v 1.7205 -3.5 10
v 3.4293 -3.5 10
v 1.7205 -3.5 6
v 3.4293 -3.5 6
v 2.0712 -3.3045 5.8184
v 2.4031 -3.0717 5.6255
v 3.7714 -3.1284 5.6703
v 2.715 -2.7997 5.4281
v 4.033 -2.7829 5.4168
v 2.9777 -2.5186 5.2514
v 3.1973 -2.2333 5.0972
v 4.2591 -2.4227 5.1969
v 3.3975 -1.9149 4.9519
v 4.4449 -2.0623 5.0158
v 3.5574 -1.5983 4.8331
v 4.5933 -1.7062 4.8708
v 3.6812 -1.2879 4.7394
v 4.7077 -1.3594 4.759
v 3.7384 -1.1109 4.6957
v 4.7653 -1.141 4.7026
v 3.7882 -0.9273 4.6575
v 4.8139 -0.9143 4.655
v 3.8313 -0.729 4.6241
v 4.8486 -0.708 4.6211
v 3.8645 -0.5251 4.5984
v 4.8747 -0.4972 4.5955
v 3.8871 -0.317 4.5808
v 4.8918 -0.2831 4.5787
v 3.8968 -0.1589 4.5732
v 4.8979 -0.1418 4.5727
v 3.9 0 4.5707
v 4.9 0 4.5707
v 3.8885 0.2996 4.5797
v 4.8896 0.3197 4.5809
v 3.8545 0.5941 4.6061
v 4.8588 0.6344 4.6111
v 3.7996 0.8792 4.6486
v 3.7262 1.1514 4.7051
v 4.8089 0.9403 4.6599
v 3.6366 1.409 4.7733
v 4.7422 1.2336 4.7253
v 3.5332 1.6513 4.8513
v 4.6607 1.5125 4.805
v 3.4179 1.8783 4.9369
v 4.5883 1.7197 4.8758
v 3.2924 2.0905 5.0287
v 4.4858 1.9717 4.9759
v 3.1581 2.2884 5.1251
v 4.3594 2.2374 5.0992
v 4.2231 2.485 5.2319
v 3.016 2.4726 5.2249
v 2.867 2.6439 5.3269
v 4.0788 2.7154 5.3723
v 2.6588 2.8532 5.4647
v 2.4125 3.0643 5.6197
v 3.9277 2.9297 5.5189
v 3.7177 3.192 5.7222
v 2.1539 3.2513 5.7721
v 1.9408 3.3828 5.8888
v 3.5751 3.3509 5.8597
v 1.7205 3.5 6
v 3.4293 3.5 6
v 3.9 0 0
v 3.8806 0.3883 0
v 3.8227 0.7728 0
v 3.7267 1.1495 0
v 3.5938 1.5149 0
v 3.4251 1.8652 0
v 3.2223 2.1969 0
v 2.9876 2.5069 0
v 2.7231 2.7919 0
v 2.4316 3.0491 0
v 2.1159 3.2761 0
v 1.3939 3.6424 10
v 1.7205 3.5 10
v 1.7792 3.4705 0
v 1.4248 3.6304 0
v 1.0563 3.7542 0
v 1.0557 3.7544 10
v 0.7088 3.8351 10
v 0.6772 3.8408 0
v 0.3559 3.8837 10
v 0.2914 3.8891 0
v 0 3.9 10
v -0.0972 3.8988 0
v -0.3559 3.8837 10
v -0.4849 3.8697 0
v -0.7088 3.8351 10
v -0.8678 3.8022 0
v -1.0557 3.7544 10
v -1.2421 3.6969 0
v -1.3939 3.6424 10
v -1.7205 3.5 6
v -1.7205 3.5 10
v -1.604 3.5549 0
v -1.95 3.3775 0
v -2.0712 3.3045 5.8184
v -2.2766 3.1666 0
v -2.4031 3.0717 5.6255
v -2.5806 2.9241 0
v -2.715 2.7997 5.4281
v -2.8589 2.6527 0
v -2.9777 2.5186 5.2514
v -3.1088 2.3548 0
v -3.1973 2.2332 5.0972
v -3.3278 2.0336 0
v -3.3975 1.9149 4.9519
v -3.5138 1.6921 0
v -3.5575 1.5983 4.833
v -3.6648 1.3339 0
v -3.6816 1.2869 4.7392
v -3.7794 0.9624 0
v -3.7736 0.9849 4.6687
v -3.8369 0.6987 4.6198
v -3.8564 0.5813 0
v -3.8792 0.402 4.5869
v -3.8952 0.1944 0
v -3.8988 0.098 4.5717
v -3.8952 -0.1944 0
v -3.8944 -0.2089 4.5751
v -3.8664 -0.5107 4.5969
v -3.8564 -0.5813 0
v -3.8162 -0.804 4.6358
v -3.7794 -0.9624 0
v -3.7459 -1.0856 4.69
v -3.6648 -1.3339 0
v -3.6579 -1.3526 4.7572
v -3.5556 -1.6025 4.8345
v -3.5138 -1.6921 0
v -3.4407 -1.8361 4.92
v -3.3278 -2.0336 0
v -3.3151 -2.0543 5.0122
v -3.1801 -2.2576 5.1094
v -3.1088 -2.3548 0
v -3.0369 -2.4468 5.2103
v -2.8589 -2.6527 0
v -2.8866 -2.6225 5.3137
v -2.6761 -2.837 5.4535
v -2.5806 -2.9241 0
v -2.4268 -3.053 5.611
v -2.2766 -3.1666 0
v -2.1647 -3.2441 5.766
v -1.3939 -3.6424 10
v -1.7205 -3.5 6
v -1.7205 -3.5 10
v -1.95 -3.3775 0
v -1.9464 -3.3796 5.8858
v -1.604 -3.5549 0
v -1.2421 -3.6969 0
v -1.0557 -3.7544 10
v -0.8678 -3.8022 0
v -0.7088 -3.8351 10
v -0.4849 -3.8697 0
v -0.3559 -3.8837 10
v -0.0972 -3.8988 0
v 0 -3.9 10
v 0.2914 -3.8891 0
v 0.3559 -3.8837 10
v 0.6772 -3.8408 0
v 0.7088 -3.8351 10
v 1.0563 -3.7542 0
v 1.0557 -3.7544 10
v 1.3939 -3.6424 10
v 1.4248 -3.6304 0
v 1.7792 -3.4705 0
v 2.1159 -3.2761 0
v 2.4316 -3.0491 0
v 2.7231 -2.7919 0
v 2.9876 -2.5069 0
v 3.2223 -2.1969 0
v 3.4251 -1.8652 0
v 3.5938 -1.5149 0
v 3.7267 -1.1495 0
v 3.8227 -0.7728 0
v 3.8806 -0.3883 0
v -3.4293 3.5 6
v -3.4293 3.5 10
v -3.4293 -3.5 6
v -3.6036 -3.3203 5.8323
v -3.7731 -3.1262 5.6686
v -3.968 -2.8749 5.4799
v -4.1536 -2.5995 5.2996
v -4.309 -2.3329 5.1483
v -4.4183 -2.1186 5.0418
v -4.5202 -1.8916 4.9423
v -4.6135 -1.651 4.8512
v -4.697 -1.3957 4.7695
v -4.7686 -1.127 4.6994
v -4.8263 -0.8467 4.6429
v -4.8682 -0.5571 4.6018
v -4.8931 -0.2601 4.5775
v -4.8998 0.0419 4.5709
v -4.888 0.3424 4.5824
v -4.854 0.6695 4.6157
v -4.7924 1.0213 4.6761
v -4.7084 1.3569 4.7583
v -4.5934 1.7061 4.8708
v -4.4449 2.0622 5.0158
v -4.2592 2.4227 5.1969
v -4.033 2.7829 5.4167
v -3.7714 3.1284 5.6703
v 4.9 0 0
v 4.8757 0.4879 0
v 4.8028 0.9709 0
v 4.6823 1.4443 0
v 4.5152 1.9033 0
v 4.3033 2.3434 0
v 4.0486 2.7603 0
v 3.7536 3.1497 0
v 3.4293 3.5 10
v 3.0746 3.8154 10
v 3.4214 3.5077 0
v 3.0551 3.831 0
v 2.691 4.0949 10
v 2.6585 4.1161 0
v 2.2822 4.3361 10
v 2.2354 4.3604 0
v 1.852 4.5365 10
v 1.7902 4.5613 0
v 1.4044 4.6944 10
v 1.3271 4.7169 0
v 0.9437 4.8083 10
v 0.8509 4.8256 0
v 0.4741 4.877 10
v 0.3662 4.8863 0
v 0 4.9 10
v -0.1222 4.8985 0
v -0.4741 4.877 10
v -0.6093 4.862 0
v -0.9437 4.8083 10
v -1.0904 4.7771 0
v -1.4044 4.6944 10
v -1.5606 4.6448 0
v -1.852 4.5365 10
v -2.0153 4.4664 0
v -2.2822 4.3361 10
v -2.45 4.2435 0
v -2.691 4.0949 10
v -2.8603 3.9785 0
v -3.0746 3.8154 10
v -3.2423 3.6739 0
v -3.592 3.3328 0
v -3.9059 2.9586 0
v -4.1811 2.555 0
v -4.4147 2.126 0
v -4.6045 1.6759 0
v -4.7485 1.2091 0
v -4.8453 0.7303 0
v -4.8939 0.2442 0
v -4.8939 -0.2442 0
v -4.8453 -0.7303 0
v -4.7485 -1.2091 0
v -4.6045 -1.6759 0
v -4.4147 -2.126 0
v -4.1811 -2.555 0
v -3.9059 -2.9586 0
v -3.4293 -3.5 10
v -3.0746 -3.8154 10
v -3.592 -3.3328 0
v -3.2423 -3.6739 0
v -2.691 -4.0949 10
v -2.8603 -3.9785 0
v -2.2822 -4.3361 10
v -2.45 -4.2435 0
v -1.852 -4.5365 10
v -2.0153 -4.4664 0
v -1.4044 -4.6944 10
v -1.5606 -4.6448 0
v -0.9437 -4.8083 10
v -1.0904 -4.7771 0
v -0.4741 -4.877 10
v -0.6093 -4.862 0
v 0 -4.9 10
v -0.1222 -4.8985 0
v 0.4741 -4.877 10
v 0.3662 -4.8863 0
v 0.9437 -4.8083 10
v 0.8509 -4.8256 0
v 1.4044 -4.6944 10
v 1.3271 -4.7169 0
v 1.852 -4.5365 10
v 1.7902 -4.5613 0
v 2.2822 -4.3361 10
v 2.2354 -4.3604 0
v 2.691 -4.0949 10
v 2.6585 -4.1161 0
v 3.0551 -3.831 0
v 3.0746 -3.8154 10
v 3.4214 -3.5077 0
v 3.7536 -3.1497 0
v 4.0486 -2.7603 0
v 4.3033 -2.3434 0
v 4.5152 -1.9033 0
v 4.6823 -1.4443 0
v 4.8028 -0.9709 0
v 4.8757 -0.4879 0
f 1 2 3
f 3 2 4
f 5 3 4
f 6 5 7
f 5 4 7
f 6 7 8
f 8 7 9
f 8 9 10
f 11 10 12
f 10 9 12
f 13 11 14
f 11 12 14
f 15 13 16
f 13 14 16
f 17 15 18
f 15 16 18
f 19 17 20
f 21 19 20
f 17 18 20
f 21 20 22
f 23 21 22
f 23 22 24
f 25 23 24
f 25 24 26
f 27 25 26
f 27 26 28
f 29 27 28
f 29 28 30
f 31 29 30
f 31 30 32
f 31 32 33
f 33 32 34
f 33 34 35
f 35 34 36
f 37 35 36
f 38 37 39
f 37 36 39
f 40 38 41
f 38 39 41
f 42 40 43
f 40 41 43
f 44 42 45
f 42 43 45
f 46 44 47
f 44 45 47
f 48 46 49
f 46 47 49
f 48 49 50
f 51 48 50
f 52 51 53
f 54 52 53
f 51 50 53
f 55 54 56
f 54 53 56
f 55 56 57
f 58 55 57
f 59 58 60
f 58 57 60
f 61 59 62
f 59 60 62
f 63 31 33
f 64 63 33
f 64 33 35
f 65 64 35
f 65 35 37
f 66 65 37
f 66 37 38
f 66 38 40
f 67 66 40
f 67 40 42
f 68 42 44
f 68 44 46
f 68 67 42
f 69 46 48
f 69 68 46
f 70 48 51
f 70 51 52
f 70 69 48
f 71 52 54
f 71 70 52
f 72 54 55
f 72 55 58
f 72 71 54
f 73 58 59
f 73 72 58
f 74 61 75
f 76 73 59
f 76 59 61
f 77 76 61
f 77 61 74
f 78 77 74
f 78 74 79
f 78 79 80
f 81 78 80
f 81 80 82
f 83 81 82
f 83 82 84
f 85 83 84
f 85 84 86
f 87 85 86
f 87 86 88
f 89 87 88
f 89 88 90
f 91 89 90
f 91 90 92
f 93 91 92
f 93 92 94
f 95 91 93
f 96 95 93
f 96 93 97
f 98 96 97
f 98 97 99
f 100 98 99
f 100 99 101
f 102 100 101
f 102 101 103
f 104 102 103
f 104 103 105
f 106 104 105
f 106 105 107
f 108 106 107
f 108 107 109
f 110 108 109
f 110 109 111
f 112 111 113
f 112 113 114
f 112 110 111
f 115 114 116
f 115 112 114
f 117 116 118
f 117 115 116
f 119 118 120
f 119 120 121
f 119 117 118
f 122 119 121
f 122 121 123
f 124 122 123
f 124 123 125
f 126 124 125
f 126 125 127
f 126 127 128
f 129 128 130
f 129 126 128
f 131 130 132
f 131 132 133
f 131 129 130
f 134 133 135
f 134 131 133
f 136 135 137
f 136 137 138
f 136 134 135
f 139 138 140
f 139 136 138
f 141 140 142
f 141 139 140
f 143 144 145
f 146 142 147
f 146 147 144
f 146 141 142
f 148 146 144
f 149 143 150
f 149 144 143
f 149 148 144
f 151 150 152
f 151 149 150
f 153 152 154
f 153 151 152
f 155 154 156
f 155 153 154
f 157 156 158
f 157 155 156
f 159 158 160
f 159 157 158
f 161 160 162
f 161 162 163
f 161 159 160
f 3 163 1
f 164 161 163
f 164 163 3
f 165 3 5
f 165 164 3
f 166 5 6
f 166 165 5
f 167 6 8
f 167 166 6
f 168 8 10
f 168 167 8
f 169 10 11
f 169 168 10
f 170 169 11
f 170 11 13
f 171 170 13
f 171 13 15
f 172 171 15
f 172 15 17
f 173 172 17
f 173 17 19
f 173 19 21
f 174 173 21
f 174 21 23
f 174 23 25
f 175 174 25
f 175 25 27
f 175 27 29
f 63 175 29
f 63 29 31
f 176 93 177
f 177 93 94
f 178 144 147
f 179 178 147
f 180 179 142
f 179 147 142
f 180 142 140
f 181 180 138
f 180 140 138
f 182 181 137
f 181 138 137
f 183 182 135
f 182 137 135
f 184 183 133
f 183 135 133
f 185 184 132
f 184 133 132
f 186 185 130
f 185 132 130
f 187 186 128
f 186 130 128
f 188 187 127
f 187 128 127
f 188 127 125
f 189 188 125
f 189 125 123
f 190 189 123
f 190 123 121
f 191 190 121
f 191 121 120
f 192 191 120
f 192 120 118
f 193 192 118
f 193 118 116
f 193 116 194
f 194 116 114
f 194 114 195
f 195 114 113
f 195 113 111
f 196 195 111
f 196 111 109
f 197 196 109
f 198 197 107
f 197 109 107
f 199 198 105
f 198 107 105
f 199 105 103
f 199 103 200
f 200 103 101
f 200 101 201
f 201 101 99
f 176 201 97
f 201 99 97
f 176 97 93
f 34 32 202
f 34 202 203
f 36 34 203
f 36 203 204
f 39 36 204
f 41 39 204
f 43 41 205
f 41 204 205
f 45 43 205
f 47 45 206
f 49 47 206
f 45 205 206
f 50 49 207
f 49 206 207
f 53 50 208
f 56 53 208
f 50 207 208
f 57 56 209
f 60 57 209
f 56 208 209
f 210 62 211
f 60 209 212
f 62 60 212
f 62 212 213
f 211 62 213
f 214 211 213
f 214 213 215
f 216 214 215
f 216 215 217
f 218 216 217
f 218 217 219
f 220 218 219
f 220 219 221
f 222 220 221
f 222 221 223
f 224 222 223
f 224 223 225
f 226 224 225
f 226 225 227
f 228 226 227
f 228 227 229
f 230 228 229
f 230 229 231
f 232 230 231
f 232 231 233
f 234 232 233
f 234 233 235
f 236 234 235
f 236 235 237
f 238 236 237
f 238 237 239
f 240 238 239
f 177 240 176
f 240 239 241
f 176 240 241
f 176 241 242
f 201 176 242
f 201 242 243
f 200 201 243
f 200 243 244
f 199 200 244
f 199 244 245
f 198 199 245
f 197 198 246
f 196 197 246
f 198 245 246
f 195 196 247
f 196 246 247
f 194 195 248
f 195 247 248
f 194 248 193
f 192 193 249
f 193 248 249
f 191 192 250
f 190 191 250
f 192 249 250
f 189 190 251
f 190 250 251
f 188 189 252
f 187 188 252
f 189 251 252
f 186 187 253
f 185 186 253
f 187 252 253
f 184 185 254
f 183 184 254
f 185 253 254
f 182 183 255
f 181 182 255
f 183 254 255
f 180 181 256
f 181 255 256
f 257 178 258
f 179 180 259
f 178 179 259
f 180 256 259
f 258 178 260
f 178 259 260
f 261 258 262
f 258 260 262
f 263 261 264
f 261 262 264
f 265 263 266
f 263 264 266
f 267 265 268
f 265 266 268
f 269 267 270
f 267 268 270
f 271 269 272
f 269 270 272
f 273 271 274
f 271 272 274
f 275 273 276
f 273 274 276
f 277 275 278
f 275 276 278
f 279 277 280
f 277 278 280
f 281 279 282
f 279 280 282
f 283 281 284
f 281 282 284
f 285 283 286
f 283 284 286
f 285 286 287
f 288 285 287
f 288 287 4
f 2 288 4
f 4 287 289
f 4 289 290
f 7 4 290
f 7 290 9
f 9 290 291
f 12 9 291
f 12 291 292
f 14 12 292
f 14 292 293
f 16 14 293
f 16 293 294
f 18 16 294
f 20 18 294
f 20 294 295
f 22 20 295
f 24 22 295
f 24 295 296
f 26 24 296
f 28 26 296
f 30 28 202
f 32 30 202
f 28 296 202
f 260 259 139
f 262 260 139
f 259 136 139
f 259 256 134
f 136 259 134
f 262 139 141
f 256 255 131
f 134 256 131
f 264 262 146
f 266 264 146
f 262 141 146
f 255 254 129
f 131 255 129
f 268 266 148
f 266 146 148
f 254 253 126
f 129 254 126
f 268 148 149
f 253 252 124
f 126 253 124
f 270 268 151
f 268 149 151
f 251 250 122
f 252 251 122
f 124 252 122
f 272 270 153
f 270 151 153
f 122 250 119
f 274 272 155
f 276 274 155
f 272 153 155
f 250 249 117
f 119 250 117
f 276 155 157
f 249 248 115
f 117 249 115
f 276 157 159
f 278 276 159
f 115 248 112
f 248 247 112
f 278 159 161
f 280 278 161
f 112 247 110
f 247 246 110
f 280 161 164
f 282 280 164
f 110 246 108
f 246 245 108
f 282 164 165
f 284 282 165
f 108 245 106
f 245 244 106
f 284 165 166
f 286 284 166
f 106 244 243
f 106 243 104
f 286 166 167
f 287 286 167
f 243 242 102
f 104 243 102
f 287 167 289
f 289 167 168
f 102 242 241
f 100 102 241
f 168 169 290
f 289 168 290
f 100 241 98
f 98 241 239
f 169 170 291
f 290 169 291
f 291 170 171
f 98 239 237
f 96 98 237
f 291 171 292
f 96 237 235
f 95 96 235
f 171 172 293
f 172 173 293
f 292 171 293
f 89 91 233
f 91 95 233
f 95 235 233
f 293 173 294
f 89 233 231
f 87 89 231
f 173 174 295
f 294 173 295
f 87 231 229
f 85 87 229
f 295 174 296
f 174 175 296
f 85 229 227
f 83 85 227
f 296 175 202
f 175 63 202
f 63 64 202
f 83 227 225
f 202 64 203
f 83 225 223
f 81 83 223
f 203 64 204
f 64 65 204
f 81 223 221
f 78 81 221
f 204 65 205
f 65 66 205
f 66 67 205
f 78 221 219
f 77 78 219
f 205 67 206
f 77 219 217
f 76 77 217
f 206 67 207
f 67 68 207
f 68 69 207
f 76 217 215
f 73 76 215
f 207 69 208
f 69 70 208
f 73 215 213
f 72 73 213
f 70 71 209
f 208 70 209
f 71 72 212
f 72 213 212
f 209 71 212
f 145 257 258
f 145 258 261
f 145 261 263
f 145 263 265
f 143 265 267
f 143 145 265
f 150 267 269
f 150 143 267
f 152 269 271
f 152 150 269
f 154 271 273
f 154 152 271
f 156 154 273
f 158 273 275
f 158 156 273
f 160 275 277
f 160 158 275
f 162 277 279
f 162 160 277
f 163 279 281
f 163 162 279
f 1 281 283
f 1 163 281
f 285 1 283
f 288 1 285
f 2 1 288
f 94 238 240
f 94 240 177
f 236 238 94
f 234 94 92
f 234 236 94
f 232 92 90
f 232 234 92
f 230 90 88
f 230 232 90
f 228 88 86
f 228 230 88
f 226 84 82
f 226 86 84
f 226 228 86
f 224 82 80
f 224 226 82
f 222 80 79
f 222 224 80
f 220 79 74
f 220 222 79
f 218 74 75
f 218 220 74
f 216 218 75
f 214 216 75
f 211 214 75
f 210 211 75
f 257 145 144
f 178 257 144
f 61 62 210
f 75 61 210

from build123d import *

# Parameters (mm, degrees)
SKETCH1_R           = 4.9
SKETCH1_R_2         = 3.9
BOSS_EXTRUDE1_DEPTH = 10
CUT_EXTRUDE1_DEPTH  = 10


with BuildPart() as part:
    # Sketch1 → Boss-Extrude1 (new body)
    with BuildSketch(Plane.XY):
        Circle(SKETCH1_R)
        Circle(SKETCH1_R_2, mode=Mode.SUBTRACT)
    extrude(amount=BOSS_EXTRUDE1_DEPTH)

    # Sketch3 → Cut-Extrude1 (cut)
    with BuildSketch(Plane(origin=(4.9, 0, 0), x_dir=(0, 0, -1), z_dir=(1, 0, 0))):
        with BuildLine():
            Line((-10, 3.5), (-10, -3.5))
            Line((-10, -3.5), (-6, -3.5))
            ThreePointArc((-6, -3.5), (-4.570714214, 0), (-6, 3.5))
            Line((-6, 3.5), (-10, 3.5))
        make_face()
    extrude(amount=-CUT_EXTRUDE1_DEPTH, mode=Mode.SUBTRACT)


solid = part.part
